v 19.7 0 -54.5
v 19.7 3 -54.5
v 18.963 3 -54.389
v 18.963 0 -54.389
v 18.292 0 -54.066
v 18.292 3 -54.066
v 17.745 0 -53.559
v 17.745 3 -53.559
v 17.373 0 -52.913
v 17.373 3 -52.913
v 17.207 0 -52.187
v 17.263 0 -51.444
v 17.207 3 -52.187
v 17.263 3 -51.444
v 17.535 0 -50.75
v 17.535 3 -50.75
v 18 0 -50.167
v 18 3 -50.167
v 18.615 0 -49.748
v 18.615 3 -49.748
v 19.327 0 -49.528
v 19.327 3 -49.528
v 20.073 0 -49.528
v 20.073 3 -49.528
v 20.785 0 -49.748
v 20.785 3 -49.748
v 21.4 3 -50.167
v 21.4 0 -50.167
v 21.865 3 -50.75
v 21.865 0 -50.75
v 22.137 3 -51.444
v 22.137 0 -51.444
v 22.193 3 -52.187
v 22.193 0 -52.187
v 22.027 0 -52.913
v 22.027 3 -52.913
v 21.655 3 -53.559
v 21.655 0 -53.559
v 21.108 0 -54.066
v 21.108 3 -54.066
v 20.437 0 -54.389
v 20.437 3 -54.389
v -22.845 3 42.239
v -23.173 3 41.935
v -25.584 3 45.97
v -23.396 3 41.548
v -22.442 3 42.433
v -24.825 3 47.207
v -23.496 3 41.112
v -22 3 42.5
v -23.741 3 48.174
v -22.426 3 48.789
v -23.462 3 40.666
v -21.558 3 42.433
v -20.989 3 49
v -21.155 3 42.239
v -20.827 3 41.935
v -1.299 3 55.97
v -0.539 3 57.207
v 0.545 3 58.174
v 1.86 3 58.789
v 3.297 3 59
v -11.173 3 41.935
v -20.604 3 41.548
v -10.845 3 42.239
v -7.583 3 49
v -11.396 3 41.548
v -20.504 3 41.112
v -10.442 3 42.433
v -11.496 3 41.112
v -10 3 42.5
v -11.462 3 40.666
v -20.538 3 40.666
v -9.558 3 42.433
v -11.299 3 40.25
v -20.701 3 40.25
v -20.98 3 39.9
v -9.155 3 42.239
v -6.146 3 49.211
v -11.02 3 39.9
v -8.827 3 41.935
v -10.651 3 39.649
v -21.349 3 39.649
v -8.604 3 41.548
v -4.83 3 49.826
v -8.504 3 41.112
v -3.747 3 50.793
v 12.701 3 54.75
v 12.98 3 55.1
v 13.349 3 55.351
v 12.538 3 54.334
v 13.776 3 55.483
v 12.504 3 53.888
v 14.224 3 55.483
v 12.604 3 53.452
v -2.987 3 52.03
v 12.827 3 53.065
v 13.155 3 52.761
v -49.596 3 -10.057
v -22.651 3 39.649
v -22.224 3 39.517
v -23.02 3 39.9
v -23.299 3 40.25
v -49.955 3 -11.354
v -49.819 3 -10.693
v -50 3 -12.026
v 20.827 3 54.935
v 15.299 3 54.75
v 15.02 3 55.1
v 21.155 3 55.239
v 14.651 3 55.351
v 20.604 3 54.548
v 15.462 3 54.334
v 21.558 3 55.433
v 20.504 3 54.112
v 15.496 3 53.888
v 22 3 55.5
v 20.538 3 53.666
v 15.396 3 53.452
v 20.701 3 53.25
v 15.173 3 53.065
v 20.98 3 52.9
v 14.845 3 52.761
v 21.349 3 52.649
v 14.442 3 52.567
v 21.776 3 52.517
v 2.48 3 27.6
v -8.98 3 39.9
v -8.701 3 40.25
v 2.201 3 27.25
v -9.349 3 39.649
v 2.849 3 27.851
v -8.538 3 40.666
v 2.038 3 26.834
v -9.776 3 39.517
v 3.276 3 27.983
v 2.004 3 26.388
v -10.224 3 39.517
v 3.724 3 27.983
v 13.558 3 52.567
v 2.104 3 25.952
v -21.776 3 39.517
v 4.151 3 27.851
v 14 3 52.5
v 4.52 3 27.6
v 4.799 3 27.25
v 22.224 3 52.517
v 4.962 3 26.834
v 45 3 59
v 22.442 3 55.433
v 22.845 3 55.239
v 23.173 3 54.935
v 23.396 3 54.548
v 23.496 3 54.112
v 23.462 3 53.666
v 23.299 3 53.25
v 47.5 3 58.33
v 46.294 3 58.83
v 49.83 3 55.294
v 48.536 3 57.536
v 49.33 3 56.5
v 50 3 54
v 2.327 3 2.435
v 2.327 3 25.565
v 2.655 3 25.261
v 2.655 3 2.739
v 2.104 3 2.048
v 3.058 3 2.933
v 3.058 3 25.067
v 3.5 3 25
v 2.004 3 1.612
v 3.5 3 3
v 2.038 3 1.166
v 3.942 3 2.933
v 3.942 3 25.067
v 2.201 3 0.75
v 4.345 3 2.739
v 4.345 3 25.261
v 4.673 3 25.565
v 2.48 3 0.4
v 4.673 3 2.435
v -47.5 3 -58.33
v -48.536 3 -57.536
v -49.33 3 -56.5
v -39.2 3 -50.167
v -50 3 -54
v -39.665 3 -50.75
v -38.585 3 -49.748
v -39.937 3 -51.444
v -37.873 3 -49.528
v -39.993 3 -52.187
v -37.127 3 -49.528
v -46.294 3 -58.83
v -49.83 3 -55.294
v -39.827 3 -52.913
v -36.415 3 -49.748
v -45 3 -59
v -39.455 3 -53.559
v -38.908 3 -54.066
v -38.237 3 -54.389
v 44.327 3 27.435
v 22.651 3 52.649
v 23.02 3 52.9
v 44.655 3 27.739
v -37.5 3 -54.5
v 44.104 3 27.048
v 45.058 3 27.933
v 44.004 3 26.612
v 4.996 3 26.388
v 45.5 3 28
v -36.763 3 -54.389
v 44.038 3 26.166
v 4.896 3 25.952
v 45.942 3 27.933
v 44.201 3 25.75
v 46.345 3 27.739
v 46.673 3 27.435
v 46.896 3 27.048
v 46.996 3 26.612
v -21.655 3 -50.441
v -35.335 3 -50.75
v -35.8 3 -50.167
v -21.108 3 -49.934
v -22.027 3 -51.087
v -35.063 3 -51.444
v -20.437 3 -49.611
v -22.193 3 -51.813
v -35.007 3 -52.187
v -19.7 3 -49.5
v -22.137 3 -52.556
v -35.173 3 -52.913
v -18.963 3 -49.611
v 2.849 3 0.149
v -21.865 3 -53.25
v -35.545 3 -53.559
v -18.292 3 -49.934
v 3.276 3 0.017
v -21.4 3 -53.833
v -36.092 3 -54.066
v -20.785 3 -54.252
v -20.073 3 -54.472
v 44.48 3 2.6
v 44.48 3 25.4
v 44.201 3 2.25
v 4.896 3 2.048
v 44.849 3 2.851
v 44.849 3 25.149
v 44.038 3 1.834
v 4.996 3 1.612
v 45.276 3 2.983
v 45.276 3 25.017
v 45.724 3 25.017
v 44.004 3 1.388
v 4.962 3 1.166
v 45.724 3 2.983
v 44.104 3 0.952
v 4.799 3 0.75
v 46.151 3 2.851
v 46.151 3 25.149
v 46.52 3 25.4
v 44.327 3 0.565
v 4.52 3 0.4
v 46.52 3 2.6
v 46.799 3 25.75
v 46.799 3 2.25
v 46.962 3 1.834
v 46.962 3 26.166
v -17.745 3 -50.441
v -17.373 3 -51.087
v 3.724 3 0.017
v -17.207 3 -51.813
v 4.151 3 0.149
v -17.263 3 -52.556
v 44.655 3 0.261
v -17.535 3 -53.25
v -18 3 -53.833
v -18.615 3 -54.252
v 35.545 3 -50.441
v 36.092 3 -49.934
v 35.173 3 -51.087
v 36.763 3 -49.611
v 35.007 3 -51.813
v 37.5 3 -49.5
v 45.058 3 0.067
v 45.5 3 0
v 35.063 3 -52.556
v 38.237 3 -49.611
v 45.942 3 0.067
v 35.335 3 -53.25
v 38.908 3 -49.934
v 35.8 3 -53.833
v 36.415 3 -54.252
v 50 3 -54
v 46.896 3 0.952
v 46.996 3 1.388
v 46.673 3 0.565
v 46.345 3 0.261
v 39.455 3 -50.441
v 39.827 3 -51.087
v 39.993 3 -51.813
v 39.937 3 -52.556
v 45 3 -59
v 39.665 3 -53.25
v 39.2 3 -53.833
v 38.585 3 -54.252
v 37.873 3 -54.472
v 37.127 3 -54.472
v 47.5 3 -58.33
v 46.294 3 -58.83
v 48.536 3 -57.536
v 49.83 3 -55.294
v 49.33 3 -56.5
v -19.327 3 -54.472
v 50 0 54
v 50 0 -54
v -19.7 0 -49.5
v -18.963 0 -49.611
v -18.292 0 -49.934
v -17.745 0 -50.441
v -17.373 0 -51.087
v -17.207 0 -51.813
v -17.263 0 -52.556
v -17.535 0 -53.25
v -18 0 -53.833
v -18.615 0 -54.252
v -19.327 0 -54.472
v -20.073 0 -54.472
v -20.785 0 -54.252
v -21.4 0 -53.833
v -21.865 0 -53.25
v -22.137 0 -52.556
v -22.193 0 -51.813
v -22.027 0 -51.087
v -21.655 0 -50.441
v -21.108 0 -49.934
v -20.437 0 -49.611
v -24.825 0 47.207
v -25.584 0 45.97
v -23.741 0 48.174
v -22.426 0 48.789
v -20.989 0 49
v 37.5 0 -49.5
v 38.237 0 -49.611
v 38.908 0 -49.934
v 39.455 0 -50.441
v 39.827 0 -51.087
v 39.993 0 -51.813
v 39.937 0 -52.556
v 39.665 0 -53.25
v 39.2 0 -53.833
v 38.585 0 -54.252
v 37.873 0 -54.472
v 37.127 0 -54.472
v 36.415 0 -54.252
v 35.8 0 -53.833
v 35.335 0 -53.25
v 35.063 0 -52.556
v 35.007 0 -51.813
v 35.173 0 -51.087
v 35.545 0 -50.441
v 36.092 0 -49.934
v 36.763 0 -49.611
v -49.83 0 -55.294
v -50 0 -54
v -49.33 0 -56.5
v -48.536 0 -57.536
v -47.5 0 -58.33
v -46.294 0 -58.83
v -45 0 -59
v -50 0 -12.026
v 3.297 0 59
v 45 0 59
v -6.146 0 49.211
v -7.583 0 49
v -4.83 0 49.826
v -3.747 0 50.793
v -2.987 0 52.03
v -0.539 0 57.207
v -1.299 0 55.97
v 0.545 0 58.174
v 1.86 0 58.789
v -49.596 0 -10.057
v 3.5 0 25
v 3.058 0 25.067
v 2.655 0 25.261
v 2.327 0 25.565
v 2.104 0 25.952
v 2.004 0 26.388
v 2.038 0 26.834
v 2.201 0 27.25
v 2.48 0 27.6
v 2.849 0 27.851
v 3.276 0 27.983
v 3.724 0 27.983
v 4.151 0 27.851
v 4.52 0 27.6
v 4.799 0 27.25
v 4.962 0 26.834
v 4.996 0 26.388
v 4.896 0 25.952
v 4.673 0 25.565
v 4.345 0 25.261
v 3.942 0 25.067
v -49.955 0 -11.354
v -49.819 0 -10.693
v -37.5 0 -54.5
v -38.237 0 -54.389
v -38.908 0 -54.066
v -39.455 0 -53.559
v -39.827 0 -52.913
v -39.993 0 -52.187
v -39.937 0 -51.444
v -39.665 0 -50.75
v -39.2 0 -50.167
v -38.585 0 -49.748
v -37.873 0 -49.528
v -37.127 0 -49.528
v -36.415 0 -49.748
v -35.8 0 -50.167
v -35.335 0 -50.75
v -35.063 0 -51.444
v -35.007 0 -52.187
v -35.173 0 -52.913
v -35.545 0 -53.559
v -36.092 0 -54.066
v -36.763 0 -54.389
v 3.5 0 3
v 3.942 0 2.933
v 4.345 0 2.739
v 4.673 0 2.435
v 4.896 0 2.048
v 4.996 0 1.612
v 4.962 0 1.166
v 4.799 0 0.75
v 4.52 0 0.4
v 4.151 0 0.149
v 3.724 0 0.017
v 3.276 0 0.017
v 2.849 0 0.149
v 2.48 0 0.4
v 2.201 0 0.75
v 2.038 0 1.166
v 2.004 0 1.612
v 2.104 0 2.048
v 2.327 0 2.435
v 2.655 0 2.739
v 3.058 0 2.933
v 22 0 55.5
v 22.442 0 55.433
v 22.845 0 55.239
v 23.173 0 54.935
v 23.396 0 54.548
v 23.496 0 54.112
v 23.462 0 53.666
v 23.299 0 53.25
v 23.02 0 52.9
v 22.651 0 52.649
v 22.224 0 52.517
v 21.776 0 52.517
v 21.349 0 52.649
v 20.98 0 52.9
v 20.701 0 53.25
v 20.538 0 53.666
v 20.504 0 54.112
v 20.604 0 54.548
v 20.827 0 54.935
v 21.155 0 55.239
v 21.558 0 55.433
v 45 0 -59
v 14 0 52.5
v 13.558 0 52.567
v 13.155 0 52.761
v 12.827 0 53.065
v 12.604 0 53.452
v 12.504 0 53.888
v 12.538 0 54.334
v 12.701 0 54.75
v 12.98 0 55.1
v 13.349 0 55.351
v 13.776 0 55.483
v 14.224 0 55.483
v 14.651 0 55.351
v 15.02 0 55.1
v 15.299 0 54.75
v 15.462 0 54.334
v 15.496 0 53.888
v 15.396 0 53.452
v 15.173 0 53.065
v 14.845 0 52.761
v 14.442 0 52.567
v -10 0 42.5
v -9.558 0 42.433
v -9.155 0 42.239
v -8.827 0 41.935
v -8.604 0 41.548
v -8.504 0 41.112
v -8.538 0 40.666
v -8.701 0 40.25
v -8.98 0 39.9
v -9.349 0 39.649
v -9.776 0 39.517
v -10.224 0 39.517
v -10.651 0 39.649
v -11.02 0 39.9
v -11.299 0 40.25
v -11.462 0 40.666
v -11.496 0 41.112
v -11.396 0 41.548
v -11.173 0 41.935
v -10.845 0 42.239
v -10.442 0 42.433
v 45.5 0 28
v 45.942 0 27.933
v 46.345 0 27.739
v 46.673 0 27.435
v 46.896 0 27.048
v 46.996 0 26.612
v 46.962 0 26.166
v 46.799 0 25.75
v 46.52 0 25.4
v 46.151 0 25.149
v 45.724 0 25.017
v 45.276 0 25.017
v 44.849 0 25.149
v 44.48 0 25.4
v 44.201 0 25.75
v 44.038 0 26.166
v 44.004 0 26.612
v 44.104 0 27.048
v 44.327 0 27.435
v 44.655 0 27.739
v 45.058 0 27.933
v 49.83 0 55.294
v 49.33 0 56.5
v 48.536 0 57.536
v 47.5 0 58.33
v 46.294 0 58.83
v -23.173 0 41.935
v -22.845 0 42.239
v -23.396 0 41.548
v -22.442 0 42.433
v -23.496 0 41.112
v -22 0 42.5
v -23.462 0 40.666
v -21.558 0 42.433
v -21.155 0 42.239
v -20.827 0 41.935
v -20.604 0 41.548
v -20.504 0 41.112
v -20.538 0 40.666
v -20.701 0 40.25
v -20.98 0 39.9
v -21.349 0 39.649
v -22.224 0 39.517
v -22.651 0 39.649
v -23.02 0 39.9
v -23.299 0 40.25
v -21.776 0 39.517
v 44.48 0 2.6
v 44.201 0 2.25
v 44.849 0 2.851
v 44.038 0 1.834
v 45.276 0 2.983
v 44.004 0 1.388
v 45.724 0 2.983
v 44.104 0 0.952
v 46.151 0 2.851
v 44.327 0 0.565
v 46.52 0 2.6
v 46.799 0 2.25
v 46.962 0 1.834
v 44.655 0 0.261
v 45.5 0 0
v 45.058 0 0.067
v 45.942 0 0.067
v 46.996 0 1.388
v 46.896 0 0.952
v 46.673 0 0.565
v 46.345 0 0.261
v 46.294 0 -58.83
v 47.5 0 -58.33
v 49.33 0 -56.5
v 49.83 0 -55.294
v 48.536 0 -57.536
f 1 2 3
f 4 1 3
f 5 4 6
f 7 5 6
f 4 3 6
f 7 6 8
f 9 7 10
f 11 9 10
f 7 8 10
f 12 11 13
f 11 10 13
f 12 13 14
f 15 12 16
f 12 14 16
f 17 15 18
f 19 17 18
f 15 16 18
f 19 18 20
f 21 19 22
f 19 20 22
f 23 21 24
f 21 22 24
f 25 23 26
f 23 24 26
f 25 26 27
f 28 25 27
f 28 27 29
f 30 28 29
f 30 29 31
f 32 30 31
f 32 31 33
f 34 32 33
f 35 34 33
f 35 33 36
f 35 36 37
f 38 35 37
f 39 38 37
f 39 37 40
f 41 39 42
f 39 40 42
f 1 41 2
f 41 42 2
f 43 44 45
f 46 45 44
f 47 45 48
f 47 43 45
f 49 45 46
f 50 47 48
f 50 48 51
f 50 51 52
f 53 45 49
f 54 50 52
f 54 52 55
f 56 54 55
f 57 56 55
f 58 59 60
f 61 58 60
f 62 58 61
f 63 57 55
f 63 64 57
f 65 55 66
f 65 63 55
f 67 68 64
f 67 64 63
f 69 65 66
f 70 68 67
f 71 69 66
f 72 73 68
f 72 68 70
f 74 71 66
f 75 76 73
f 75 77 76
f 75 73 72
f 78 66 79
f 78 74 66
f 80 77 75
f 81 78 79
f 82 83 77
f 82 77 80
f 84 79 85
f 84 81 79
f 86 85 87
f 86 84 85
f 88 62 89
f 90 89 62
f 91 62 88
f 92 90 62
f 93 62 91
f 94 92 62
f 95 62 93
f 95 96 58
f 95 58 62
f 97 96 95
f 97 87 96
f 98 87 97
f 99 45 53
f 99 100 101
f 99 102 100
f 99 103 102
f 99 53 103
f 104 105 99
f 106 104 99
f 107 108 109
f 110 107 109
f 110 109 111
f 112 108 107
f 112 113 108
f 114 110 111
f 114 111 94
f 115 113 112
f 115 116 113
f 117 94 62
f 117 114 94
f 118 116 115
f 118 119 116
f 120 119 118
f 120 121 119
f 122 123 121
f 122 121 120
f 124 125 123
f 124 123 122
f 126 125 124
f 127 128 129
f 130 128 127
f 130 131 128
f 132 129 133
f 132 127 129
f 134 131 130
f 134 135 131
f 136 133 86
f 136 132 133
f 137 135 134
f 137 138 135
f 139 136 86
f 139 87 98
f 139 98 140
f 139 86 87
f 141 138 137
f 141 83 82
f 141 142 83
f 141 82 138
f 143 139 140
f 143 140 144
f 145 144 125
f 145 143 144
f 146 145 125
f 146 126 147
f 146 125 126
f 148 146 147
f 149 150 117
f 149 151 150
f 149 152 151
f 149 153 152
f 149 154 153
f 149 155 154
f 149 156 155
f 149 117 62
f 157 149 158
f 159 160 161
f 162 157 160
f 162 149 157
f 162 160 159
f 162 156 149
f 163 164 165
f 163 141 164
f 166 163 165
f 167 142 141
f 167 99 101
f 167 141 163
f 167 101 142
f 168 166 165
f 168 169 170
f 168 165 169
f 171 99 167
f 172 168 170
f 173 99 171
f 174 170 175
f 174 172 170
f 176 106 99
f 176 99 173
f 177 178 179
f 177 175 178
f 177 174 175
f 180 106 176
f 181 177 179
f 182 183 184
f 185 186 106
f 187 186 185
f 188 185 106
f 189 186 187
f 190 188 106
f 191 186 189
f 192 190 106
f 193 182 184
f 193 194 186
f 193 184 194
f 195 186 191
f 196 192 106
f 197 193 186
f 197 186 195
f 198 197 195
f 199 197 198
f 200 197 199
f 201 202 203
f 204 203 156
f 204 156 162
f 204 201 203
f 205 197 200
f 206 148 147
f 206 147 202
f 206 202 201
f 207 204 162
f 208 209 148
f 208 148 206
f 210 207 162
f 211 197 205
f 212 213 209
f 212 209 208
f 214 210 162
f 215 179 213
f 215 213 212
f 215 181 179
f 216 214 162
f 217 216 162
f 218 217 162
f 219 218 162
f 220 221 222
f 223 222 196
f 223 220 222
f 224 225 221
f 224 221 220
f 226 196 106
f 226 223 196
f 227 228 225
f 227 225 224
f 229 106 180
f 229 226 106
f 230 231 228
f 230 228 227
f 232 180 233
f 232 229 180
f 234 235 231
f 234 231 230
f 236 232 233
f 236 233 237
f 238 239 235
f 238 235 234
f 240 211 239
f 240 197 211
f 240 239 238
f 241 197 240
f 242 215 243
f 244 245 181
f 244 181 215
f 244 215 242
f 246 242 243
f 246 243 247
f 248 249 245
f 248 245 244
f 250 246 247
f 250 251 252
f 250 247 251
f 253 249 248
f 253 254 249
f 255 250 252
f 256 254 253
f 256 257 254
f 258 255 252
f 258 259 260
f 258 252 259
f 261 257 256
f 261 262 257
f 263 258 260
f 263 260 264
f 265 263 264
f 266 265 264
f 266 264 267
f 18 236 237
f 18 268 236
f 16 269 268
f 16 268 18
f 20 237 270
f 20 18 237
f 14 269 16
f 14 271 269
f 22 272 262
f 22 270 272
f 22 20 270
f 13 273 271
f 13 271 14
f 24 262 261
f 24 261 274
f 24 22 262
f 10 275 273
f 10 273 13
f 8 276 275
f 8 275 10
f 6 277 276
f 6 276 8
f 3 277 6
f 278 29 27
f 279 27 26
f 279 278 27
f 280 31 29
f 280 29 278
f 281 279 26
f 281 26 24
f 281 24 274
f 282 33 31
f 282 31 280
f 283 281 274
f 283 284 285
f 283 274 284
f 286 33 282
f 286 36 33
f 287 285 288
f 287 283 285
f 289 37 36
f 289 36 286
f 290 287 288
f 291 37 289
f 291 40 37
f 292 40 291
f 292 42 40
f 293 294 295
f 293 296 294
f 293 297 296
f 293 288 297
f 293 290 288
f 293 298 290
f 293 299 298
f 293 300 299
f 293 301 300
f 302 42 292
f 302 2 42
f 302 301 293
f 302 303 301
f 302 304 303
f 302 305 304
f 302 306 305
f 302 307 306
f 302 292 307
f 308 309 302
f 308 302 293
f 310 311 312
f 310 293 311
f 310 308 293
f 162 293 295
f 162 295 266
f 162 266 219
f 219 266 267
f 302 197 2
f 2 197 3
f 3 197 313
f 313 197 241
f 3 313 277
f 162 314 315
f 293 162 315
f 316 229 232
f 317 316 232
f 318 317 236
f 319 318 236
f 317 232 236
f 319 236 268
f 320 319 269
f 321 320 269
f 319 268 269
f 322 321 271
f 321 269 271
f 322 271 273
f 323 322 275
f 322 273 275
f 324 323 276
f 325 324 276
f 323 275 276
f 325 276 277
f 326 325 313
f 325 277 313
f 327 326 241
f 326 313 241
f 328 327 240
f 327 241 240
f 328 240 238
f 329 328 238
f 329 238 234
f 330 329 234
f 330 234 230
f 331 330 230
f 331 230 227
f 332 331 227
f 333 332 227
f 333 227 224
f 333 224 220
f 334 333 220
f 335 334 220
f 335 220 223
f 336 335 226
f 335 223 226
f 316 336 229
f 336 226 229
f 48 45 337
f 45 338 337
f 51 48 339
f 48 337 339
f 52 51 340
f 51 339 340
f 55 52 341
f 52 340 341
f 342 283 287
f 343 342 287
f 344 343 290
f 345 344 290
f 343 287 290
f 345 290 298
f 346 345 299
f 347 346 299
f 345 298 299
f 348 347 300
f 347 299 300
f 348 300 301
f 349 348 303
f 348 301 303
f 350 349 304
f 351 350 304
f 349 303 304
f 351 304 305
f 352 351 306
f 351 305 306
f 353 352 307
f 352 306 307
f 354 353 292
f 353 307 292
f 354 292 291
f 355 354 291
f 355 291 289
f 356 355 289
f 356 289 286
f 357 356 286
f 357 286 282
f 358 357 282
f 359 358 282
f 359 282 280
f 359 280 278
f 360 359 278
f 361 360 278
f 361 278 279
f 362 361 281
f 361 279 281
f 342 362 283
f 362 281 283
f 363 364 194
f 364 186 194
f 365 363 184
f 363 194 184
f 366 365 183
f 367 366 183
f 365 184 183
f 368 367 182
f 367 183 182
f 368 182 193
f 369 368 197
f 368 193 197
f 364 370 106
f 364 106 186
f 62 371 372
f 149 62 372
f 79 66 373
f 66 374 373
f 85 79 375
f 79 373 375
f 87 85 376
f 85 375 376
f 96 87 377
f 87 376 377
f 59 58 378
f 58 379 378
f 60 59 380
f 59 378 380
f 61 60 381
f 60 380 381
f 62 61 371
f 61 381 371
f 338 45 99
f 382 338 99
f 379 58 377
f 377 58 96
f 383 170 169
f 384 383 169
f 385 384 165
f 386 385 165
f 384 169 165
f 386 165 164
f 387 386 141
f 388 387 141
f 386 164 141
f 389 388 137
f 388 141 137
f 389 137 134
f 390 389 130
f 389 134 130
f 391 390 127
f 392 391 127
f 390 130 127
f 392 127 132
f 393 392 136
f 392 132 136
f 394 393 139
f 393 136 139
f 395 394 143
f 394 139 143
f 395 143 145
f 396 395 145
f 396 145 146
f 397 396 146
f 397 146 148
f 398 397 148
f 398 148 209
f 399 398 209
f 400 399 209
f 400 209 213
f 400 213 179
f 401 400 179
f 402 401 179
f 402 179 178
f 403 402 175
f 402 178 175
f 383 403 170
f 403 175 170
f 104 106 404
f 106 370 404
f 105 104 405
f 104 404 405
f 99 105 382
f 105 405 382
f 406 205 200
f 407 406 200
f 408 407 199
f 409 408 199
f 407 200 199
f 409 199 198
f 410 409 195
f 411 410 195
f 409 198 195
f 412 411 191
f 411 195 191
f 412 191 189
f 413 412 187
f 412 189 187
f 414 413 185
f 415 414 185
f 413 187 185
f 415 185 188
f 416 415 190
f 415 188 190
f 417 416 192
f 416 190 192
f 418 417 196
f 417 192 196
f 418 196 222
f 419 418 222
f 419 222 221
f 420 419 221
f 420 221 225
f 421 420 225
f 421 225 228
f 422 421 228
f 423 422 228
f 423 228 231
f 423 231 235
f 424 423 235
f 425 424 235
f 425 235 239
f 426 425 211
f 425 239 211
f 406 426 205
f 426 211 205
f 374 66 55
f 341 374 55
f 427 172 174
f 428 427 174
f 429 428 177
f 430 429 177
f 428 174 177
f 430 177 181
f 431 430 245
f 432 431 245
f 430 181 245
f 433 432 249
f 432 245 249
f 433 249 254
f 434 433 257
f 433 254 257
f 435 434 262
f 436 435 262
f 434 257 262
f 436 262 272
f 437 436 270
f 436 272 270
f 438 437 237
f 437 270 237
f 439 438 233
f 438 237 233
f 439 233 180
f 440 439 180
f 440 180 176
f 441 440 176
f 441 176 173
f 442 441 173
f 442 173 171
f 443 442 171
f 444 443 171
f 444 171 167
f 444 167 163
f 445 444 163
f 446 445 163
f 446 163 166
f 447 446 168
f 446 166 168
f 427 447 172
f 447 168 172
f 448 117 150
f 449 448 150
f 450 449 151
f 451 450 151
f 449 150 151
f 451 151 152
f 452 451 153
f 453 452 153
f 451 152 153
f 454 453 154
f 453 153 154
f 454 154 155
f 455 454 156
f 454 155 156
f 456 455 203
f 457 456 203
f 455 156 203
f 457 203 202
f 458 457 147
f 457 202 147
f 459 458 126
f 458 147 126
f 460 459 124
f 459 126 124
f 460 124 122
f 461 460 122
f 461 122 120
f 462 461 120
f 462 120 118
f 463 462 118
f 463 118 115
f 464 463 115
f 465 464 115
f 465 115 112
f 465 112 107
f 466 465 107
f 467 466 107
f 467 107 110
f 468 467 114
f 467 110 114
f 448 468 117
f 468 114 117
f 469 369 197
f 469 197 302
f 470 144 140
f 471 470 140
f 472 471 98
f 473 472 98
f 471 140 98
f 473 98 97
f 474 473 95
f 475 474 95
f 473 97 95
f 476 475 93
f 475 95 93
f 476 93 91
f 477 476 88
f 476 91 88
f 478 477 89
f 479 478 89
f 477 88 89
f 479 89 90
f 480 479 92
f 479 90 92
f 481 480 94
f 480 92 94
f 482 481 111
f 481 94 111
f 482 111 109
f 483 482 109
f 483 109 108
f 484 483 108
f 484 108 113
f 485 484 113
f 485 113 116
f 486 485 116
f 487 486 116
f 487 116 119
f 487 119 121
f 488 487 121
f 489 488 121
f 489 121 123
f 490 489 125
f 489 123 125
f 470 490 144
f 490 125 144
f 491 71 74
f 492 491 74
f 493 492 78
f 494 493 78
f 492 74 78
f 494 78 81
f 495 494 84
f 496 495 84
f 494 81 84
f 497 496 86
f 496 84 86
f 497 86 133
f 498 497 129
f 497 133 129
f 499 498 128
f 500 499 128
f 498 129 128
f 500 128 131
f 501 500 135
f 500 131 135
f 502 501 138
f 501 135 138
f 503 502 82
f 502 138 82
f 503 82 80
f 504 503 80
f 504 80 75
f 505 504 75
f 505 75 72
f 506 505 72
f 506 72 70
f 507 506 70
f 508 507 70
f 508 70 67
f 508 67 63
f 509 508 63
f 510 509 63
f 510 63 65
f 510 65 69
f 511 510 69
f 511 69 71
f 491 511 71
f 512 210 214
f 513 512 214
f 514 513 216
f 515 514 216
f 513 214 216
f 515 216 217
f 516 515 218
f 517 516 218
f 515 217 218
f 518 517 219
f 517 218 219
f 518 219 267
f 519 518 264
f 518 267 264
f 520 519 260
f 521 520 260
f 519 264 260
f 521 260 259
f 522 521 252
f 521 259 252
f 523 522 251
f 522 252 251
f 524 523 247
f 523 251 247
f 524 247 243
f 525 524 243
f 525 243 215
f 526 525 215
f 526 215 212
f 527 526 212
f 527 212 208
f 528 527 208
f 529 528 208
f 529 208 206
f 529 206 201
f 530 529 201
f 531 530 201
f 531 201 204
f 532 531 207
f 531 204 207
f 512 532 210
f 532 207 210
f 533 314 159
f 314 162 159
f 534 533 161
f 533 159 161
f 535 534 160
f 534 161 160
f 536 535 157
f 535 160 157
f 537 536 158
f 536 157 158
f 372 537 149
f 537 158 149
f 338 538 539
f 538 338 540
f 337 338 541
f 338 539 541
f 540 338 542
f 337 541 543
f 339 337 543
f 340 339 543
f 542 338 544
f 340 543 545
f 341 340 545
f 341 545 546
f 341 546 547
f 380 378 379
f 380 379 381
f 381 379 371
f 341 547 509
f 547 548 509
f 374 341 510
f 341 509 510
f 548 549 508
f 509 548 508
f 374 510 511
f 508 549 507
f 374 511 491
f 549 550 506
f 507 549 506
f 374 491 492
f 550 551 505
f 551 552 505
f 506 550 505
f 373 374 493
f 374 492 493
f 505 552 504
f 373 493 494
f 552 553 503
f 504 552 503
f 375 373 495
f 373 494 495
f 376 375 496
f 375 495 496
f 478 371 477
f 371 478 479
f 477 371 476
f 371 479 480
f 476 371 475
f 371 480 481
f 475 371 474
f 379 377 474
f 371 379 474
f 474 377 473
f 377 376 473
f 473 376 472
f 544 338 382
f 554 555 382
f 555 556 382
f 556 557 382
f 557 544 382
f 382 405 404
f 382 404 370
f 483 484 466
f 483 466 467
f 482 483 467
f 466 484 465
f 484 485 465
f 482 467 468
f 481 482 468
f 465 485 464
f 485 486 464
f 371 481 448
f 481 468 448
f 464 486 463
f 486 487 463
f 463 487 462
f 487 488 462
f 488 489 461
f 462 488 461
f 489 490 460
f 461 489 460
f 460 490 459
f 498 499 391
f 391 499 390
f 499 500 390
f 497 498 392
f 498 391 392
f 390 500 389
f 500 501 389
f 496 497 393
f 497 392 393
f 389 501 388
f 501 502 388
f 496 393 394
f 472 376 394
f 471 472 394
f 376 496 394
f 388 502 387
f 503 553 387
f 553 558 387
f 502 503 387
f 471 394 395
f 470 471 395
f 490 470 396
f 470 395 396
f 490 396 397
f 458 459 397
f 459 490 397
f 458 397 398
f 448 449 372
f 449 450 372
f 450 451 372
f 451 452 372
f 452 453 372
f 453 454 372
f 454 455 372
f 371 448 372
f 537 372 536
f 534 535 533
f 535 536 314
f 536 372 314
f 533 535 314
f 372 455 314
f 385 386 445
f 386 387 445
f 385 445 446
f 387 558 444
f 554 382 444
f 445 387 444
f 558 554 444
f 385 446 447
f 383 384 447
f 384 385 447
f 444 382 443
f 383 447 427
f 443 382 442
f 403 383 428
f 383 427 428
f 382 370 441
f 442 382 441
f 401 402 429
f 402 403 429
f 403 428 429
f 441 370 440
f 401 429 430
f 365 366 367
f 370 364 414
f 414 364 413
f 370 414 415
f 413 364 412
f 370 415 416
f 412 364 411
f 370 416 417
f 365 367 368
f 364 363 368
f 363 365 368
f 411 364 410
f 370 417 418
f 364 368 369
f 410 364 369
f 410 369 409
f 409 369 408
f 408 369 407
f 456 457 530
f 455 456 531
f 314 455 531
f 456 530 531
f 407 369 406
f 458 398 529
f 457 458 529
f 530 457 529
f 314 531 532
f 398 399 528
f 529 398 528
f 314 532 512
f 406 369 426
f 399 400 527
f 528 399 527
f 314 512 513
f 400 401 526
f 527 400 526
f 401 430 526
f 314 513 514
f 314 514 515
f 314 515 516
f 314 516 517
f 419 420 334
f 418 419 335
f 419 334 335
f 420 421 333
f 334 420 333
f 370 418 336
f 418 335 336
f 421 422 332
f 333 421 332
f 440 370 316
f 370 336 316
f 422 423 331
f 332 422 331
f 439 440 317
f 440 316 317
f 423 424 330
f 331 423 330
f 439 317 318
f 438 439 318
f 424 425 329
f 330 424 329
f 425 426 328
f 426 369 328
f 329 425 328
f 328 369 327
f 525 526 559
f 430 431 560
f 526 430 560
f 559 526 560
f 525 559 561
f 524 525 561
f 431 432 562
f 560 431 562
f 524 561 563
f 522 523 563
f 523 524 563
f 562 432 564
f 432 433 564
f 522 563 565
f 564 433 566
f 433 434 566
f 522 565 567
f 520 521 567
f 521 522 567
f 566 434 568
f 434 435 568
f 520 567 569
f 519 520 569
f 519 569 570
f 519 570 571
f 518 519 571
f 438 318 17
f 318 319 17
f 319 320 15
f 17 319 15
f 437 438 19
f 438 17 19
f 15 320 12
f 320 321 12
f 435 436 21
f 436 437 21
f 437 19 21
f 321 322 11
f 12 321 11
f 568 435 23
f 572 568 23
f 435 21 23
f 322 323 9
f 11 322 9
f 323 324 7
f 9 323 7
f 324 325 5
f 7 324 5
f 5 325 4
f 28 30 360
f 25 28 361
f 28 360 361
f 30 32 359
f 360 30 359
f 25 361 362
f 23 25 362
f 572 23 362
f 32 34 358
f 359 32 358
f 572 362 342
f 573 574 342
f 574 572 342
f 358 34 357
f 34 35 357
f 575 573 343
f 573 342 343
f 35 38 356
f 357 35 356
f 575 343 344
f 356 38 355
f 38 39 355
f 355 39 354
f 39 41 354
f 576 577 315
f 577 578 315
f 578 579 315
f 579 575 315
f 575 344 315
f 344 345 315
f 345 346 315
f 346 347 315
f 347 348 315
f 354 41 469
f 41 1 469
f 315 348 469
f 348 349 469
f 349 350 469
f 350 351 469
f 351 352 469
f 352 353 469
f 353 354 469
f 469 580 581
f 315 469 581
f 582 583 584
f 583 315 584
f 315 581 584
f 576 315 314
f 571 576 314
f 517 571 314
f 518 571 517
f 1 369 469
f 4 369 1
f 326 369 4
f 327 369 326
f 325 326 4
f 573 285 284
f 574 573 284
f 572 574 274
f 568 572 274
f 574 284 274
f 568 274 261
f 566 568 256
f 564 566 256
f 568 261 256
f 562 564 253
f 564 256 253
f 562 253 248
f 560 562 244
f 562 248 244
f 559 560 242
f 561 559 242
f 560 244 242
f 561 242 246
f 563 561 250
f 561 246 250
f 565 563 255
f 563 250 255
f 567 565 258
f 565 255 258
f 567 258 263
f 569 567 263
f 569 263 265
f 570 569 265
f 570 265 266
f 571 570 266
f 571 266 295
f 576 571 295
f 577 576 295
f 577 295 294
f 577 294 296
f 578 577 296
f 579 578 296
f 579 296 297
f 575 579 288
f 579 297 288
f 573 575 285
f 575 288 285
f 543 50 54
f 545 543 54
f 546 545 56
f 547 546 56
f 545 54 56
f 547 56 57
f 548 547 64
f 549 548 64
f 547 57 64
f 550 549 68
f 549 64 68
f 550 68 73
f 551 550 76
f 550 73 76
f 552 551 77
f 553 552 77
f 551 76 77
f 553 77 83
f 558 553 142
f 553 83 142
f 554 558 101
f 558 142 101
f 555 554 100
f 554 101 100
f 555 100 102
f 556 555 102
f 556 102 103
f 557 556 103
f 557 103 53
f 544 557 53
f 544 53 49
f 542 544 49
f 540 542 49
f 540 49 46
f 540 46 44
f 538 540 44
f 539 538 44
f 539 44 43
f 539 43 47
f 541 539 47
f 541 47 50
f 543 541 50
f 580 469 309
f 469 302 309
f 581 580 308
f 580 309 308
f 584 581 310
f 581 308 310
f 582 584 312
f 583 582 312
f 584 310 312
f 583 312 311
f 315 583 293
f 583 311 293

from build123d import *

# Parameters (mm, degrees)
SKETCH_1_W          = 100
SKETCH_1_H          = 118
EXTRUDE_1_DEPTH     = 3
SKETCH_3_R          = 1.5
CUT_EXTRUDE_2_DEPTH = 3
SKETCH_4_R          = 2.5
CUT_EXTRUDE_3_DEPTH = 3
SKETCH_5_R          = 1.5
CUT_EXTRUDE_4_DEPTH = 3
CUT_EXTRUDE_6_DEPTH = 3
SKETCH_9_R          = 1.5
CUT_EXTRUDE_8_DEPTH = 10
FILLET_3_R          = 5


with BuildPart() as part:
    # 草图1 → 凸台-拉伸1 (new body)
    with BuildSketch(Plane(origin=(0, 0, 0), x_dir=(1, 0, 0), z_dir=(0, 1, 0))):
        Rectangle(SKETCH_1_W, SKETCH_1_H)
    extrude(amount=EXTRUDE_1_DEPTH)

    # 草图3 → 切除-拉伸2 (cut)
    with BuildSketch(Plane(origin=(0, 3, 0), x_dir=(1, 0, 0), z_dir=(0, 1, 0))):
        with Locations((3.5, -1.5)):
            Circle(SKETCH_3_R)
        with Locations((45.5, -1.5)):
            Circle(SKETCH_3_R)
        with Locations((45.5, -26.5)):
            Circle(SKETCH_3_R)
        with Locations((3.5, -26.5)):
            Circle(SKETCH_3_R)
    extrude(amount=-CUT_EXTRUDE_2_DEPTH, mode=Mode.SUBTRACT)

    # 草图4 → 切除-拉伸3 (cut)
    with BuildSketch(Plane(origin=(0, 3, 0), x_dir=(1, 0, 0), z_dir=(0, 1, 0))):
        with Locations((37.5, 52)):
            Circle(SKETCH_4_R)
        with Locations((19.7, 52)):
            Circle(SKETCH_4_R)
        with Locations((-19.7, 52)):
            Circle(SKETCH_4_R)
        with Locations((-37.5, 52)):
            Circle(SKETCH_4_R)
    extrude(amount=-CUT_EXTRUDE_3_DEPTH, mode=Mode.SUBTRACT)

    # 草图5 → 切除-拉伸4 (cut)
    with BuildSketch(Plane(origin=(0, 3, 0), x_dir=(1, 0, 0), z_dir=(0, 1, 0))):
        with Locations((22, -54)):
            Circle(SKETCH_5_R)
        with Locations((14, -54)):
            Circle(SKETCH_5_R)
    extrude(amount=-CUT_EXTRUDE_4_DEPTH, mode=Mode.SUBTRACT)

    # 草图7 → 切除-拉伸6 (cut)
    with BuildSketch(Plane(origin=(0, 3, 0), x_dir=(1, 0, 0), z_dir=(0, 1, 0))):
        Polygon((-24.285714286, -49), (-50, 11), (-50, -59), (0, -59), (-4.285714286, -49), align=None)
    extrude(amount=-CUT_EXTRUDE_6_DEPTH, mode=Mode.SUBTRACT)

    # 草图9 → 切除-拉伸8 (cut)
    with BuildSketch(Plane(origin=(0, 3, 0), x_dir=(1, 0, 0), z_dir=(0, 1, 0))):
        with Locations((-22, -41)):
            Circle(SKETCH_9_R)
        with Locations((-10, -41)):
            Circle(SKETCH_9_R)
    extrude(amount=-CUT_EXTRUDE_8_DEPTH, mode=Mode.SUBTRACT)

    # 圆角3
    fillet_3_edges = [part.edges().sort_by_distance(p)[0] for p in [
        (-50, 1.5, -59),
        (-50, 1.5, -11),
        (-24.285714286, 1.5, 49),
        (-4.285714286, 1.5, 49),
        (0, 1.5, 59),
        (50, 1.5, 59),
        (50, 1.5, -59),
    ]]
    fillet(fillet_3_edges, radius=FILLET_3_R)


solid = part.part
